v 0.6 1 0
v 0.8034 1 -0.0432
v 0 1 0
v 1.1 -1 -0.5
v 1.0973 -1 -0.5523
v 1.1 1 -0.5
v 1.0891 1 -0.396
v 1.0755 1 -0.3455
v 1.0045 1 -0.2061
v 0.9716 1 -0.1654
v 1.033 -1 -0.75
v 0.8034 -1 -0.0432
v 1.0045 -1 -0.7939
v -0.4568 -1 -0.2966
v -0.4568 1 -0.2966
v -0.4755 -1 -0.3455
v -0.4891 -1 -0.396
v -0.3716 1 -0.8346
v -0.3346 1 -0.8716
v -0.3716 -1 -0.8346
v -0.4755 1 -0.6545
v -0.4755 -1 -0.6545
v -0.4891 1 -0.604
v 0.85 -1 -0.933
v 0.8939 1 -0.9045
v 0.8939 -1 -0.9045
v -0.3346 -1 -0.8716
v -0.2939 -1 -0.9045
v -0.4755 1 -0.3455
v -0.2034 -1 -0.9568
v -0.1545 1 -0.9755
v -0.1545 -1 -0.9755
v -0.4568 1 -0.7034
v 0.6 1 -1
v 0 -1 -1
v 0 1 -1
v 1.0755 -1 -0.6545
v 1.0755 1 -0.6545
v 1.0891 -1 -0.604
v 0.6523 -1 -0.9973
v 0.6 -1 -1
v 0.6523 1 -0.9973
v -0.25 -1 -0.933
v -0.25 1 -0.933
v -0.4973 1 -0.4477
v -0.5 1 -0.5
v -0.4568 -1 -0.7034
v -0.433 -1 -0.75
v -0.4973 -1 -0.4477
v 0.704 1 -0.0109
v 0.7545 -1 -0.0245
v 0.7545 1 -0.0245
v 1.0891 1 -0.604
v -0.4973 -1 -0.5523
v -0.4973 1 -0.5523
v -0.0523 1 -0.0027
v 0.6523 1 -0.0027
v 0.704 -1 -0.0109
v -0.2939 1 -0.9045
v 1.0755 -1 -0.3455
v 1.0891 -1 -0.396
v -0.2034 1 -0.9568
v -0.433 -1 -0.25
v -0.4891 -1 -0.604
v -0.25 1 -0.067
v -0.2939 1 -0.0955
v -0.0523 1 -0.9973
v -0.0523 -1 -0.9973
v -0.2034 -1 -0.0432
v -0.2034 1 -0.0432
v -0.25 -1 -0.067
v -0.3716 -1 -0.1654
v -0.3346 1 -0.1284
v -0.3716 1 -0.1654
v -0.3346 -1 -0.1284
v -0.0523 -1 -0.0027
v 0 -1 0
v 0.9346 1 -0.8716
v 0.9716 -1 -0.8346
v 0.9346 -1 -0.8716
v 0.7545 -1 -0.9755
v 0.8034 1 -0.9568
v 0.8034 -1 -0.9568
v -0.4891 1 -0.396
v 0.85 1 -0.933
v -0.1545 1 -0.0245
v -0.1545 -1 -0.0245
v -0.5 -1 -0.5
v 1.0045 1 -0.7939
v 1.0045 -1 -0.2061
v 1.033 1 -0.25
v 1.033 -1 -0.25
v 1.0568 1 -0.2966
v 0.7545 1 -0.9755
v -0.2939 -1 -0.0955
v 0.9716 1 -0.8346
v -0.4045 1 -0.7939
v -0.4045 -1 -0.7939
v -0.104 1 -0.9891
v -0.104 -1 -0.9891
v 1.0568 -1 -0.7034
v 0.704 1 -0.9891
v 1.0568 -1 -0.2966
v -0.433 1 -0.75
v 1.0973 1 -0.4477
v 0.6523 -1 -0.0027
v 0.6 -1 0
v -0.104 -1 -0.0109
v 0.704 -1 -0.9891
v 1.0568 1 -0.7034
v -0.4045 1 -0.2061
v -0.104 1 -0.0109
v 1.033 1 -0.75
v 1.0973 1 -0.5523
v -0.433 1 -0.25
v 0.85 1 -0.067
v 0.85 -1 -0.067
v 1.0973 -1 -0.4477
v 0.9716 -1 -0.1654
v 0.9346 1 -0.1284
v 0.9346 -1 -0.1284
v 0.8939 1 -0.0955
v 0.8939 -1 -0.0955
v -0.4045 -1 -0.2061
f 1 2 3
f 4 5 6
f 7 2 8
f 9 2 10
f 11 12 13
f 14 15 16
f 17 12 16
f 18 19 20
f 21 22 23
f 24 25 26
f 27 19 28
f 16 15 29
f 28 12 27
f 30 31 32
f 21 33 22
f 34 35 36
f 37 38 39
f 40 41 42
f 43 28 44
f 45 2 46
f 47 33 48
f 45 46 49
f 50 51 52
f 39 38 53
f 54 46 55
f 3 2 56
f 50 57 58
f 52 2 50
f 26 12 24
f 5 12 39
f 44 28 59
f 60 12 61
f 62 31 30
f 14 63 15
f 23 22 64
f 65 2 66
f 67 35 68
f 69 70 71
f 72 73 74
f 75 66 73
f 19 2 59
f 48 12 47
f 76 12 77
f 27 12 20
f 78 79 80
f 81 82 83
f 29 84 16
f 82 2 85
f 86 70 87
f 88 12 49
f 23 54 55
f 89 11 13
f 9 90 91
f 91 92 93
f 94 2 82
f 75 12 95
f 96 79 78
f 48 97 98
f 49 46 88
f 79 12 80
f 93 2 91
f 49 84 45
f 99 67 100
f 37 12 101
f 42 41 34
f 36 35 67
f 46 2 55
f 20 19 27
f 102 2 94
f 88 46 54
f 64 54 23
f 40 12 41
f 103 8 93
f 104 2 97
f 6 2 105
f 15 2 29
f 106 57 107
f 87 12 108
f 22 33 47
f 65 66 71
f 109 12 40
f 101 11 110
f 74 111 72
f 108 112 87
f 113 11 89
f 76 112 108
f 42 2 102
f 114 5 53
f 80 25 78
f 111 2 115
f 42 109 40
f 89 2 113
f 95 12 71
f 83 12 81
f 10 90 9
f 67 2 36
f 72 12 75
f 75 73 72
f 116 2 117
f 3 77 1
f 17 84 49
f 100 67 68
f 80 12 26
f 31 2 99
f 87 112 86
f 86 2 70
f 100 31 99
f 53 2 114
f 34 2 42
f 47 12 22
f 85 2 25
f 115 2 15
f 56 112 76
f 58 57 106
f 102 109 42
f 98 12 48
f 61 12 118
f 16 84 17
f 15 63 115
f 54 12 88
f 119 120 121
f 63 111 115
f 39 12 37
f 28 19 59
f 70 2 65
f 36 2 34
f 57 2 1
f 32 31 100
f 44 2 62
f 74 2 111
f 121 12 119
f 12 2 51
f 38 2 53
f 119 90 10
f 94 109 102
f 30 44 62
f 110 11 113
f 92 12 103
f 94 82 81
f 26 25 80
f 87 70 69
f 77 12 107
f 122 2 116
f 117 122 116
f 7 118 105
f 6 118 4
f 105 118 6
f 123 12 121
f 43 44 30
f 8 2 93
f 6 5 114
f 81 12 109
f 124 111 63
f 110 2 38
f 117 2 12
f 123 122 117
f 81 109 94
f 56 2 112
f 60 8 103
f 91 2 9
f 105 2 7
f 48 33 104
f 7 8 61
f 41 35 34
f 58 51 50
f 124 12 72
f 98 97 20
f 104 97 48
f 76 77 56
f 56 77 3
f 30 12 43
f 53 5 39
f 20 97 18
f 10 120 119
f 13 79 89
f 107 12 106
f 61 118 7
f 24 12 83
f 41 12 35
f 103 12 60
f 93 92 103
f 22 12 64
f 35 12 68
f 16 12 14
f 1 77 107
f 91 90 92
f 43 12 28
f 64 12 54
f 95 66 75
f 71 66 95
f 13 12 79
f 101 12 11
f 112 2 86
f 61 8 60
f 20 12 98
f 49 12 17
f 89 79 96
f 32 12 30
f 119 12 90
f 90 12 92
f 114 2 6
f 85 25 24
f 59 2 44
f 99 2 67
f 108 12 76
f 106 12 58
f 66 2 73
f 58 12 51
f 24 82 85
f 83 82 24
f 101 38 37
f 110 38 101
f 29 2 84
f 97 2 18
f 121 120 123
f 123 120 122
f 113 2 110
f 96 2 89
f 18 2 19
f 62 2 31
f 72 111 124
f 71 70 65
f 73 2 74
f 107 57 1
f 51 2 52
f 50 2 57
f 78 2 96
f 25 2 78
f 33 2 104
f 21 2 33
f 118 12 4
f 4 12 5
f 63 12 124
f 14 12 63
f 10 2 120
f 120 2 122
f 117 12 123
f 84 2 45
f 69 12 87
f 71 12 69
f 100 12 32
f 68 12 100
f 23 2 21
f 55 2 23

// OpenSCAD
// file: ../Meta/Resolution.scad
// Settings: Resolution 0 = low, 1 = high
RESOLUTION = 1;
function Resolution(low, high) = RESOLUTION == 0 ? low : high;
// main file
use <../Meta/Resolution.scad>;

function TriggerFingerDiameter() = 1;
function TriggerFingerRadius() = TriggerFingerDiameter()/2;

module TriggerFingerSlot(radius=TriggerFingerRadius(), length=0.6, $fn=Resolution(12, 60)) {
  
  hull()
  for (i = [0,length])
  translate([i,0,-radius])
  rotate([90,0,0])
  cylinder(r=radius,
           h=2, $fn=$fn, center=true);
}

TriggerFingerSlot();
